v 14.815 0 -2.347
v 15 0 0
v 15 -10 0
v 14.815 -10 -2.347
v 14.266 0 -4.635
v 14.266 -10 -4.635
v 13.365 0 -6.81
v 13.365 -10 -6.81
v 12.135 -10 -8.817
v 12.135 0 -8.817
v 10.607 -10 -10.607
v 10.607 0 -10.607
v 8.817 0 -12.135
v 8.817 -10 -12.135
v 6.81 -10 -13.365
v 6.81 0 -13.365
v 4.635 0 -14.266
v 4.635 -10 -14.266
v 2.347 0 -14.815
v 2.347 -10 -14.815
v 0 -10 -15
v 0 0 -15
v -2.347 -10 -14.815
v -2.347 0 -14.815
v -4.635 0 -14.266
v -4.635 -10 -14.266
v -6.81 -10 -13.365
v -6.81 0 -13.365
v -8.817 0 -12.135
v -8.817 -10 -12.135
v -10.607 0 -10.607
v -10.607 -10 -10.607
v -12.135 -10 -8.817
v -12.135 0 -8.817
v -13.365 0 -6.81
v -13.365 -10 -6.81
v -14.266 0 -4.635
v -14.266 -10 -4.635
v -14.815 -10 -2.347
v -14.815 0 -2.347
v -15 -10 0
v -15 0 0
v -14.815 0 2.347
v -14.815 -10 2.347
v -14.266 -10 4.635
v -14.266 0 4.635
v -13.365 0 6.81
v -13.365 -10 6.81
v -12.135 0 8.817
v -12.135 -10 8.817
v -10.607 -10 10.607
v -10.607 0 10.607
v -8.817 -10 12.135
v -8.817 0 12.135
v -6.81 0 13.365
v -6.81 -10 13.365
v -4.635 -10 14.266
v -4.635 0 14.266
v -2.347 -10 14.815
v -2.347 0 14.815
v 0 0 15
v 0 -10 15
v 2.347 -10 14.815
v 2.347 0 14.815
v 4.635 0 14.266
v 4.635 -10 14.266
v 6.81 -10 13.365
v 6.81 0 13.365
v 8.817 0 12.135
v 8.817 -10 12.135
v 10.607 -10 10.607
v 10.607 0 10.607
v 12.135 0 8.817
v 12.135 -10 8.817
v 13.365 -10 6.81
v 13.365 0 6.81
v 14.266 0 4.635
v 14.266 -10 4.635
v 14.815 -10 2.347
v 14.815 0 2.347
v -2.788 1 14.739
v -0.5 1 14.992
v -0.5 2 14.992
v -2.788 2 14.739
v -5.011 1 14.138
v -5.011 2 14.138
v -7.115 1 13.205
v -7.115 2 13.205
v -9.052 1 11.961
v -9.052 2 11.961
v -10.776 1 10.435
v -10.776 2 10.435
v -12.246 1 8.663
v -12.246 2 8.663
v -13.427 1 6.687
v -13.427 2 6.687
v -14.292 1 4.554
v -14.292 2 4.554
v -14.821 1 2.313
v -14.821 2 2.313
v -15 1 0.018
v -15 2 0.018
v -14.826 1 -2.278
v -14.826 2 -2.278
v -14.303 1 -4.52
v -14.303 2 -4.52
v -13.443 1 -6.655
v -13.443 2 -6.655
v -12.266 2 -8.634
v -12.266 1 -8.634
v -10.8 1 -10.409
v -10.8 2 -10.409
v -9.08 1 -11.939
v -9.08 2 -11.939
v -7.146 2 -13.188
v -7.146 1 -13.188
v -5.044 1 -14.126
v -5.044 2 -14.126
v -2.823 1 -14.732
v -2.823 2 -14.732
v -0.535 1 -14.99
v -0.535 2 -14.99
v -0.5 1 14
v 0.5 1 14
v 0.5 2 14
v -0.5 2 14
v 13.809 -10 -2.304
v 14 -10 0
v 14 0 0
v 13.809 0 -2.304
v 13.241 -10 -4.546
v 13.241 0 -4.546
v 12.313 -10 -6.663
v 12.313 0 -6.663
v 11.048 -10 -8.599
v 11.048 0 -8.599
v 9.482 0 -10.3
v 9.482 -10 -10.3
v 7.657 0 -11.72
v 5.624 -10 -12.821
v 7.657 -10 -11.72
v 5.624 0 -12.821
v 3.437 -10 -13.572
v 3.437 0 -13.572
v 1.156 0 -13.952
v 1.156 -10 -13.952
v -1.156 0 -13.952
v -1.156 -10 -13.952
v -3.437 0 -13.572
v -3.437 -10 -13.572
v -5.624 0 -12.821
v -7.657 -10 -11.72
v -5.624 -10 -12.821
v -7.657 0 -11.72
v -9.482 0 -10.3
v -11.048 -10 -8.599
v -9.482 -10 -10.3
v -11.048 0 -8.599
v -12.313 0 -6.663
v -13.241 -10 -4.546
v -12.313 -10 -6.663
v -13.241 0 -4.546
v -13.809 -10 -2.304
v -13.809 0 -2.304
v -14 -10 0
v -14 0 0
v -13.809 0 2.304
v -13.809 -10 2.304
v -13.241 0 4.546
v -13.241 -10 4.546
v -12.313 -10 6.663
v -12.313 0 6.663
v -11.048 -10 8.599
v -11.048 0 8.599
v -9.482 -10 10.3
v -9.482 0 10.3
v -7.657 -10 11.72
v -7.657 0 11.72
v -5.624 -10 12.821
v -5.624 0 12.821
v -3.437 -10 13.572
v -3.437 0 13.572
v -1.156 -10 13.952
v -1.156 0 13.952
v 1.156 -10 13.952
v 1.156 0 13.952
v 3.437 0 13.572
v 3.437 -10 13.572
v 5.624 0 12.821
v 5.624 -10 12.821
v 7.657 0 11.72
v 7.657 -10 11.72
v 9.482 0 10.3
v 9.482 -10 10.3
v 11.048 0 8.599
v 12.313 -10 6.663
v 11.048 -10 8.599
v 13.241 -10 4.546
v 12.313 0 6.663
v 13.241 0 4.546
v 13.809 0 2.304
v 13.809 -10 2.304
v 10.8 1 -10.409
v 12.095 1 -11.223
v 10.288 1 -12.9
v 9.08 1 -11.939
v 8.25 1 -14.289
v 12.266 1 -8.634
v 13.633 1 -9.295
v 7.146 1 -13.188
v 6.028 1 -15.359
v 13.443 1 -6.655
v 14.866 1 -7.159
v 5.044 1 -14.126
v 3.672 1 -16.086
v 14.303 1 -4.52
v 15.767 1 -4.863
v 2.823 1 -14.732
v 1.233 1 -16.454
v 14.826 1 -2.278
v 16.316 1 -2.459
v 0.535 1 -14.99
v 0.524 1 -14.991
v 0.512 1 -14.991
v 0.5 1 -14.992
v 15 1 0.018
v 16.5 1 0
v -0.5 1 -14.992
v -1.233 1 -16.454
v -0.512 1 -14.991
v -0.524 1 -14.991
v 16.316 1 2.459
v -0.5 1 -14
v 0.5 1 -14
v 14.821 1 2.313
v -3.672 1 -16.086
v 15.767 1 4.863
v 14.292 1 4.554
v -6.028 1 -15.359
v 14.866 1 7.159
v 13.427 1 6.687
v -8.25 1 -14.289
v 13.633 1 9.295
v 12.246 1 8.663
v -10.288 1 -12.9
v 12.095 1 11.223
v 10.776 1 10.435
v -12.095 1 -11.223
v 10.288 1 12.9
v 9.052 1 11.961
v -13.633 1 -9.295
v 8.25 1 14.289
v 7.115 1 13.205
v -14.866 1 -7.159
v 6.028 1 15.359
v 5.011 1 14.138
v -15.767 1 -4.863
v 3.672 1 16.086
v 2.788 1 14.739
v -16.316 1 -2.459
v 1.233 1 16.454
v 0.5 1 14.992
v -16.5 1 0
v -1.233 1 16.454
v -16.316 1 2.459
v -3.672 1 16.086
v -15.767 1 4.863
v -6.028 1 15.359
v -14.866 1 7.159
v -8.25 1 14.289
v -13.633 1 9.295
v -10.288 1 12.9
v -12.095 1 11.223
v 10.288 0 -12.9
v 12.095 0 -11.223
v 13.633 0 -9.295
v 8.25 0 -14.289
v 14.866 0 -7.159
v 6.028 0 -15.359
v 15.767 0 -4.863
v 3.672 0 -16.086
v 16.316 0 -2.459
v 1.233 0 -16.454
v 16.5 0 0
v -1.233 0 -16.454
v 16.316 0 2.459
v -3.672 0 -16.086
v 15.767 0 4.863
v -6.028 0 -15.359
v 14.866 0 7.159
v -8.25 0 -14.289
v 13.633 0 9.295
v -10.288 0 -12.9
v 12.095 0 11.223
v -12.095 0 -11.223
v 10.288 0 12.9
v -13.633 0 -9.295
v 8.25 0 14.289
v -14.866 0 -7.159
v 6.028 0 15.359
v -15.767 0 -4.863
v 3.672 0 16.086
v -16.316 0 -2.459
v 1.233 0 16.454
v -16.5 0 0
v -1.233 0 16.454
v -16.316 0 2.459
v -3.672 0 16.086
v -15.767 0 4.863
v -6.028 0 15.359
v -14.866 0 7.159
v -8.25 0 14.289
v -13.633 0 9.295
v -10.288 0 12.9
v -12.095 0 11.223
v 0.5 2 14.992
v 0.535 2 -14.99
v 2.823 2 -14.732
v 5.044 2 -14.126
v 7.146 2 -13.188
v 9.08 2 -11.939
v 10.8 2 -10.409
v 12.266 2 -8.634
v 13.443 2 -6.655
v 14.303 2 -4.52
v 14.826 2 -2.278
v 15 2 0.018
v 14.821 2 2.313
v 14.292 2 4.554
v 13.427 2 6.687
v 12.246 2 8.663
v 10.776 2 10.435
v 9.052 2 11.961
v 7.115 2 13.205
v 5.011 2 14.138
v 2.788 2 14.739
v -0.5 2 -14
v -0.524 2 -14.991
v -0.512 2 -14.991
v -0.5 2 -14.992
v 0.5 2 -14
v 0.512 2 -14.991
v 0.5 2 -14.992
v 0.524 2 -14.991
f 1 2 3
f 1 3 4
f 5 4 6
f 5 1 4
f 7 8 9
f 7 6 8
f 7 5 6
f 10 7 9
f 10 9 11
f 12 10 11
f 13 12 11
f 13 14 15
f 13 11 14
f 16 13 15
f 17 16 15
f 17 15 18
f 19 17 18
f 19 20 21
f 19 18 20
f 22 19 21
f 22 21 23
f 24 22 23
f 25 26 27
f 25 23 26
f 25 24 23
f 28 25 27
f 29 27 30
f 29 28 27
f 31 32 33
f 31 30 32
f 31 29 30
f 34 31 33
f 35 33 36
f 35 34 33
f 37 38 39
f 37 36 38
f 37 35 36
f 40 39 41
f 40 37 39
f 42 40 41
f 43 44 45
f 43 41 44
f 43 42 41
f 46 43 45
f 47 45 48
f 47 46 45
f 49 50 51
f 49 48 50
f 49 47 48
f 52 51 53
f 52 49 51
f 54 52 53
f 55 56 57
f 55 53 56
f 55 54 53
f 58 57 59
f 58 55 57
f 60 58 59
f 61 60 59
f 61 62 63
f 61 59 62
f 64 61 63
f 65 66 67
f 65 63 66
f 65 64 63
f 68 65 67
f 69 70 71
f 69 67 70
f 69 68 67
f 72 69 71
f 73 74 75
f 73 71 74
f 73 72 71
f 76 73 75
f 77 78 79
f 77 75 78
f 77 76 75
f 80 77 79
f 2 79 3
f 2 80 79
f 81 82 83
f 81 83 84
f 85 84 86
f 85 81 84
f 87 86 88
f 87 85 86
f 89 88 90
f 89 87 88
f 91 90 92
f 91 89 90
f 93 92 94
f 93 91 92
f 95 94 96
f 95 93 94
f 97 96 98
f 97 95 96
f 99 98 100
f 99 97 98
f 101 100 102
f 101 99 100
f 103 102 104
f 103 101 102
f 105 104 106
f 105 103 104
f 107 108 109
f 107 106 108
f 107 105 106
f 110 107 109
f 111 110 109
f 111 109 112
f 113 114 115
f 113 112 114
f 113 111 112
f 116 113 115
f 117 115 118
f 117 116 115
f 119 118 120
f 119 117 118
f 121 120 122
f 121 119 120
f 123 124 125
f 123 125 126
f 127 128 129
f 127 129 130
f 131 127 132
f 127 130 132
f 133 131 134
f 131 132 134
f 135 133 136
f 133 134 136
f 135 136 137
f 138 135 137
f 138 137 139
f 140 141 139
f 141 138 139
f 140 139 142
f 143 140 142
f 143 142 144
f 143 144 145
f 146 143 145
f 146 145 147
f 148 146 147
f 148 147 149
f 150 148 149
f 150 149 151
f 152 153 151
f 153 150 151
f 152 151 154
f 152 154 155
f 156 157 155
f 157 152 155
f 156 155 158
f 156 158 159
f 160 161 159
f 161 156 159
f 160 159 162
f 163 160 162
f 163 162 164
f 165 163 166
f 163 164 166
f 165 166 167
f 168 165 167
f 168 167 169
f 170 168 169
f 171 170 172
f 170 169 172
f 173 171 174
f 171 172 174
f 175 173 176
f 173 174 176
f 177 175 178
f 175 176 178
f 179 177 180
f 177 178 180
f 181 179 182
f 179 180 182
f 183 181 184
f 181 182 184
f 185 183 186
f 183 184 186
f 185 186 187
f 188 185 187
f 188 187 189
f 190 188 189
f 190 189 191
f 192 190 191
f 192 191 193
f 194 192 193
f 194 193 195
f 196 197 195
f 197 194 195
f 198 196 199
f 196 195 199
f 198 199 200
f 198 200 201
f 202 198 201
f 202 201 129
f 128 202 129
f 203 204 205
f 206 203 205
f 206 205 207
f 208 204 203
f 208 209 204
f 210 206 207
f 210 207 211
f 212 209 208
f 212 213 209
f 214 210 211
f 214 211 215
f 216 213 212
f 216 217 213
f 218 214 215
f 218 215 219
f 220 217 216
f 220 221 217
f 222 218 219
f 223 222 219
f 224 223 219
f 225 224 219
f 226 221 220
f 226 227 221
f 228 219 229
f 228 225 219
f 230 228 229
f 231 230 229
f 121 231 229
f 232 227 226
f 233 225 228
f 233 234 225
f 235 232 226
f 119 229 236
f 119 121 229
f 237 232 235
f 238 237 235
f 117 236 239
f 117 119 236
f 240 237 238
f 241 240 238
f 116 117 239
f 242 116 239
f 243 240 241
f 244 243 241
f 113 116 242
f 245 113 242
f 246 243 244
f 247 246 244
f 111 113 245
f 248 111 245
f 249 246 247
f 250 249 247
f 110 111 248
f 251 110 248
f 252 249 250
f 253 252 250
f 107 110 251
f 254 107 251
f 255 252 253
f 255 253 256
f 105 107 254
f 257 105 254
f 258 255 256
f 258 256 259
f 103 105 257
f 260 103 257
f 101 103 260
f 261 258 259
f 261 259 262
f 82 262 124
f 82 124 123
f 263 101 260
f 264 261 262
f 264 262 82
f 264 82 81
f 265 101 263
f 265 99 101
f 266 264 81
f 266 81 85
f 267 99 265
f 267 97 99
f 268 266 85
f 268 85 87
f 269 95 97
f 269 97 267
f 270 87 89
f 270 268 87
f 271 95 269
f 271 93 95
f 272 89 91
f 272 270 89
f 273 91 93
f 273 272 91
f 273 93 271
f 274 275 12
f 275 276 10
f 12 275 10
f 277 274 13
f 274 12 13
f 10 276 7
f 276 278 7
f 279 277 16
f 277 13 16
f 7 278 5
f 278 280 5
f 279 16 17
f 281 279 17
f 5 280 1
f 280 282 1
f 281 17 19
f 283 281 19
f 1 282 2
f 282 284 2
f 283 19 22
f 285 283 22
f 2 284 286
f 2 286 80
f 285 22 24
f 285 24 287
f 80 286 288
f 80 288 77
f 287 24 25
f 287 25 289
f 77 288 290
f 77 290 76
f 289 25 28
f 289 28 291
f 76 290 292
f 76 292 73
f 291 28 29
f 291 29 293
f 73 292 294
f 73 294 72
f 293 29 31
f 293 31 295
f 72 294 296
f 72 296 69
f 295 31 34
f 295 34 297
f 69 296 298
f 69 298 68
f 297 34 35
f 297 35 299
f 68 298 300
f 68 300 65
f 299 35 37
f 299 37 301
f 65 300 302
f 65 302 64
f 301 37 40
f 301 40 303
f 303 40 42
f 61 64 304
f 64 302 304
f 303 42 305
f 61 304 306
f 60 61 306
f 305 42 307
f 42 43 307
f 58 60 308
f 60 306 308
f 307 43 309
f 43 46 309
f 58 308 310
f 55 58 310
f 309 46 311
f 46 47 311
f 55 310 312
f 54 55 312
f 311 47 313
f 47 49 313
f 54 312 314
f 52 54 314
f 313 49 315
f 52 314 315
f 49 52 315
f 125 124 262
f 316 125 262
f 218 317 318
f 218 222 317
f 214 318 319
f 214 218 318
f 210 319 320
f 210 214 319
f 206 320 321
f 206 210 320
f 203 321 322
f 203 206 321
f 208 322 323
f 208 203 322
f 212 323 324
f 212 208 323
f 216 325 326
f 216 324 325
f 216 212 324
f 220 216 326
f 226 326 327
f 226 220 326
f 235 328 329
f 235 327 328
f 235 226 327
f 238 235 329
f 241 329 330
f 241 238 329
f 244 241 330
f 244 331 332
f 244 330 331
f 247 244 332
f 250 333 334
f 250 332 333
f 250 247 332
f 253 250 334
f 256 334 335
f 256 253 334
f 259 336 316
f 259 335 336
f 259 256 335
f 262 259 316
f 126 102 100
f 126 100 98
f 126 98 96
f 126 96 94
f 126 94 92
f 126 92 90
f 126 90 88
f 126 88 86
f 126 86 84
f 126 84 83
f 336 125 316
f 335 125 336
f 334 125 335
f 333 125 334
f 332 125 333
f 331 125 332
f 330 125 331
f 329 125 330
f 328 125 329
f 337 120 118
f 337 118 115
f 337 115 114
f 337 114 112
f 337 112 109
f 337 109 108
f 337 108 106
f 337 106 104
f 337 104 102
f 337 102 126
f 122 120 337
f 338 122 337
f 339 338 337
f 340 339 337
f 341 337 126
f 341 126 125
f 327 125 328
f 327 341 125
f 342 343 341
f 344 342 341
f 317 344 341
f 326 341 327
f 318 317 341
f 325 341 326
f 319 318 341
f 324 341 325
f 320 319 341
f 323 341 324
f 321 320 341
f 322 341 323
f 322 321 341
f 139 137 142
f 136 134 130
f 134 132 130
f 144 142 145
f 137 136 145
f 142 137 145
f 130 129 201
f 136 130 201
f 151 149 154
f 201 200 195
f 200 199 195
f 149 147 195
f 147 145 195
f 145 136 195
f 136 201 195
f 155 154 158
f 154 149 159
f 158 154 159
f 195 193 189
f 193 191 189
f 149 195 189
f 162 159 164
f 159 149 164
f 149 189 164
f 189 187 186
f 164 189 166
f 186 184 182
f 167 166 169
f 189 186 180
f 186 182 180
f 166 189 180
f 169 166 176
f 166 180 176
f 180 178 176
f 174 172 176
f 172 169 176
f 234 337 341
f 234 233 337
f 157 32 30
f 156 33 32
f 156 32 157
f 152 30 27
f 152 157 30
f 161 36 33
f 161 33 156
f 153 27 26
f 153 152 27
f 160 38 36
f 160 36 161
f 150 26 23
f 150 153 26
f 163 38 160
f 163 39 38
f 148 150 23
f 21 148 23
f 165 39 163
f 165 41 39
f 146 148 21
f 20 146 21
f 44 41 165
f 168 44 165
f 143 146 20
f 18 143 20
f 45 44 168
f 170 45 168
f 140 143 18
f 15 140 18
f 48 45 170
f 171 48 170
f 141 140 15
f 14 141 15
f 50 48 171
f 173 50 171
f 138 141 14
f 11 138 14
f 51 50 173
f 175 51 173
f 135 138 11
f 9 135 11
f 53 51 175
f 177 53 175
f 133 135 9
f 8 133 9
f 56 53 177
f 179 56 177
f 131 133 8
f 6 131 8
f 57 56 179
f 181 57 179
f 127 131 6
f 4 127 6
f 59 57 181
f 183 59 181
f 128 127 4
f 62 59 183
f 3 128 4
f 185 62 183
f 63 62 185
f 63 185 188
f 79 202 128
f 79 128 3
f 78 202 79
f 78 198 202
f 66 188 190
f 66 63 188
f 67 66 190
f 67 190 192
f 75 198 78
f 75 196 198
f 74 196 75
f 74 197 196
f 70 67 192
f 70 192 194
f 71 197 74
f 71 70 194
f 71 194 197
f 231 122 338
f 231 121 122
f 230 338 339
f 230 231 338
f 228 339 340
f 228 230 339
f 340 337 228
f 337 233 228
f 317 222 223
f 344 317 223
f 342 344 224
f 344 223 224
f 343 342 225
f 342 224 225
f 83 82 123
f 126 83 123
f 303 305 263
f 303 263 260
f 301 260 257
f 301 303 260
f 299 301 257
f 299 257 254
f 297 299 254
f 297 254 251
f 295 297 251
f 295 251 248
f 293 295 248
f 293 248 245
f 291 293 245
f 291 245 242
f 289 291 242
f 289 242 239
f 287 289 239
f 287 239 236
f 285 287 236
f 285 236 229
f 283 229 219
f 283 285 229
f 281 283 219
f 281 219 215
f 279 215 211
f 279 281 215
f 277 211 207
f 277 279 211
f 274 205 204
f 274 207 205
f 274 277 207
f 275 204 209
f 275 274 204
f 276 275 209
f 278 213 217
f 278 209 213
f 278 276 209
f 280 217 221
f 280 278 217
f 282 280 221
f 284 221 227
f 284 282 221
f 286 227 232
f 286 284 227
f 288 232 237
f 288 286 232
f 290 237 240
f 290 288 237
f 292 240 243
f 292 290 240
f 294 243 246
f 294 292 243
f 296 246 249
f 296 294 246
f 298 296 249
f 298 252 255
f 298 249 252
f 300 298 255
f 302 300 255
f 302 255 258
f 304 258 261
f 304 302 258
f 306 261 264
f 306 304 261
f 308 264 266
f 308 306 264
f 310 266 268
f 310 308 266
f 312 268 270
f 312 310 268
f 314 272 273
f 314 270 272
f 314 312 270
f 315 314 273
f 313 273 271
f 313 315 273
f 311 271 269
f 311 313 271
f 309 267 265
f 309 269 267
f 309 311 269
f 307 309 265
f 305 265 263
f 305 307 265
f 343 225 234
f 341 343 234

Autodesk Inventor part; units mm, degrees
sketch "Эскиз5" plane through (0, 0, 0) normal (0, 1, 0) x (-1, 0, 0)
  circle A0 centre (0, 0) radius 16.5
  dimension "d12" = 33
extrude "Выдавливание4" add sketch "Эскиз5" along normal blind 1
sketch "Эскиз7" plane through (0, 1, 0) normal (0, 1, 0) x (1, 0, 0)
  circle A0 centre (0, 0) radius 16
  circle A1 centre (0, 0) radius 16.5 projected
  arc A2 (-0.5, 14.9917) -> (-0.5354, 14.9904) centre (0, 0) ccw
  line L0 (0.5, -14) -> (-0.5, -14)
  line L1 (-0.5, 14) -> (0.5, 14)
  line L2 (0.5, -14) -> (-0.5, 14) construction
  line L3 (-0.5, -14) -> (0.5, 14) construction
  line L4 (-0.5, -14) -> (0.5, -14)
  line L5 (0.5, -14) -> (0.5, -15.4866)
  line L6 (0.5, -15.4866) -> (-0.5, -15.4866)
  line L7 (-0.5, -15.4866) -> (-0.5, -14)
  line L8 (0.5, 14) -> (-0.5, 14)
  line L9 (-0.5, 14) -> (-0.5, 15.7701)
  line L10 (-0.5, 15.7701) -> (0.5, 15.7701)
  line L11 (0.5, 15.7701) -> (0.5, 14)
  arc A3 (0.5, -14.9917) -> (0.5354, 14.9904) centre (0, 0) ccw
  arc A4 (0.5354, 14.9904) -> (0.5, 14.9917) centre (0, 0) ccw
  arc A5 (-0.5354, 14.9904) -> (-0.5, -14.9917) centre (0, 0) ccw
  dimension "d17" = 1
  dimension "d18" = 28
  dimension "d19" = 32
  dimension "d21" = 2.045
  dimension "d22" = 177.955
  dimension "d23" = 0
  dimension "d24" = 1.7701
  dimension "d25" = 31.2568
  dimension "d26" = 0.5
  dimension "d27" = 15.7701
  dimension "d30" = 15
  dimension "d31" = 15
extrude "Выдавливание6" add sketch "Эскиз7" along normal blind 1 contours L9 L1 L11 A4 A3 L5 L0 L7 A5 A2
sketch "Эскиз9" plane through (0, 0, 0) normal (0, -1, 0) x (1, 0, 0)
  circle A0 centre (0, 0) radius 15
  circle A1 centre (0, 0) radius 14
  dimension "d41" = 30
  dimension "d42" = 28
extrude "Выдавливание8" add sketch "Эскиз9" along normal blind 10
properties part number "Крышка и батарейный отсек"
